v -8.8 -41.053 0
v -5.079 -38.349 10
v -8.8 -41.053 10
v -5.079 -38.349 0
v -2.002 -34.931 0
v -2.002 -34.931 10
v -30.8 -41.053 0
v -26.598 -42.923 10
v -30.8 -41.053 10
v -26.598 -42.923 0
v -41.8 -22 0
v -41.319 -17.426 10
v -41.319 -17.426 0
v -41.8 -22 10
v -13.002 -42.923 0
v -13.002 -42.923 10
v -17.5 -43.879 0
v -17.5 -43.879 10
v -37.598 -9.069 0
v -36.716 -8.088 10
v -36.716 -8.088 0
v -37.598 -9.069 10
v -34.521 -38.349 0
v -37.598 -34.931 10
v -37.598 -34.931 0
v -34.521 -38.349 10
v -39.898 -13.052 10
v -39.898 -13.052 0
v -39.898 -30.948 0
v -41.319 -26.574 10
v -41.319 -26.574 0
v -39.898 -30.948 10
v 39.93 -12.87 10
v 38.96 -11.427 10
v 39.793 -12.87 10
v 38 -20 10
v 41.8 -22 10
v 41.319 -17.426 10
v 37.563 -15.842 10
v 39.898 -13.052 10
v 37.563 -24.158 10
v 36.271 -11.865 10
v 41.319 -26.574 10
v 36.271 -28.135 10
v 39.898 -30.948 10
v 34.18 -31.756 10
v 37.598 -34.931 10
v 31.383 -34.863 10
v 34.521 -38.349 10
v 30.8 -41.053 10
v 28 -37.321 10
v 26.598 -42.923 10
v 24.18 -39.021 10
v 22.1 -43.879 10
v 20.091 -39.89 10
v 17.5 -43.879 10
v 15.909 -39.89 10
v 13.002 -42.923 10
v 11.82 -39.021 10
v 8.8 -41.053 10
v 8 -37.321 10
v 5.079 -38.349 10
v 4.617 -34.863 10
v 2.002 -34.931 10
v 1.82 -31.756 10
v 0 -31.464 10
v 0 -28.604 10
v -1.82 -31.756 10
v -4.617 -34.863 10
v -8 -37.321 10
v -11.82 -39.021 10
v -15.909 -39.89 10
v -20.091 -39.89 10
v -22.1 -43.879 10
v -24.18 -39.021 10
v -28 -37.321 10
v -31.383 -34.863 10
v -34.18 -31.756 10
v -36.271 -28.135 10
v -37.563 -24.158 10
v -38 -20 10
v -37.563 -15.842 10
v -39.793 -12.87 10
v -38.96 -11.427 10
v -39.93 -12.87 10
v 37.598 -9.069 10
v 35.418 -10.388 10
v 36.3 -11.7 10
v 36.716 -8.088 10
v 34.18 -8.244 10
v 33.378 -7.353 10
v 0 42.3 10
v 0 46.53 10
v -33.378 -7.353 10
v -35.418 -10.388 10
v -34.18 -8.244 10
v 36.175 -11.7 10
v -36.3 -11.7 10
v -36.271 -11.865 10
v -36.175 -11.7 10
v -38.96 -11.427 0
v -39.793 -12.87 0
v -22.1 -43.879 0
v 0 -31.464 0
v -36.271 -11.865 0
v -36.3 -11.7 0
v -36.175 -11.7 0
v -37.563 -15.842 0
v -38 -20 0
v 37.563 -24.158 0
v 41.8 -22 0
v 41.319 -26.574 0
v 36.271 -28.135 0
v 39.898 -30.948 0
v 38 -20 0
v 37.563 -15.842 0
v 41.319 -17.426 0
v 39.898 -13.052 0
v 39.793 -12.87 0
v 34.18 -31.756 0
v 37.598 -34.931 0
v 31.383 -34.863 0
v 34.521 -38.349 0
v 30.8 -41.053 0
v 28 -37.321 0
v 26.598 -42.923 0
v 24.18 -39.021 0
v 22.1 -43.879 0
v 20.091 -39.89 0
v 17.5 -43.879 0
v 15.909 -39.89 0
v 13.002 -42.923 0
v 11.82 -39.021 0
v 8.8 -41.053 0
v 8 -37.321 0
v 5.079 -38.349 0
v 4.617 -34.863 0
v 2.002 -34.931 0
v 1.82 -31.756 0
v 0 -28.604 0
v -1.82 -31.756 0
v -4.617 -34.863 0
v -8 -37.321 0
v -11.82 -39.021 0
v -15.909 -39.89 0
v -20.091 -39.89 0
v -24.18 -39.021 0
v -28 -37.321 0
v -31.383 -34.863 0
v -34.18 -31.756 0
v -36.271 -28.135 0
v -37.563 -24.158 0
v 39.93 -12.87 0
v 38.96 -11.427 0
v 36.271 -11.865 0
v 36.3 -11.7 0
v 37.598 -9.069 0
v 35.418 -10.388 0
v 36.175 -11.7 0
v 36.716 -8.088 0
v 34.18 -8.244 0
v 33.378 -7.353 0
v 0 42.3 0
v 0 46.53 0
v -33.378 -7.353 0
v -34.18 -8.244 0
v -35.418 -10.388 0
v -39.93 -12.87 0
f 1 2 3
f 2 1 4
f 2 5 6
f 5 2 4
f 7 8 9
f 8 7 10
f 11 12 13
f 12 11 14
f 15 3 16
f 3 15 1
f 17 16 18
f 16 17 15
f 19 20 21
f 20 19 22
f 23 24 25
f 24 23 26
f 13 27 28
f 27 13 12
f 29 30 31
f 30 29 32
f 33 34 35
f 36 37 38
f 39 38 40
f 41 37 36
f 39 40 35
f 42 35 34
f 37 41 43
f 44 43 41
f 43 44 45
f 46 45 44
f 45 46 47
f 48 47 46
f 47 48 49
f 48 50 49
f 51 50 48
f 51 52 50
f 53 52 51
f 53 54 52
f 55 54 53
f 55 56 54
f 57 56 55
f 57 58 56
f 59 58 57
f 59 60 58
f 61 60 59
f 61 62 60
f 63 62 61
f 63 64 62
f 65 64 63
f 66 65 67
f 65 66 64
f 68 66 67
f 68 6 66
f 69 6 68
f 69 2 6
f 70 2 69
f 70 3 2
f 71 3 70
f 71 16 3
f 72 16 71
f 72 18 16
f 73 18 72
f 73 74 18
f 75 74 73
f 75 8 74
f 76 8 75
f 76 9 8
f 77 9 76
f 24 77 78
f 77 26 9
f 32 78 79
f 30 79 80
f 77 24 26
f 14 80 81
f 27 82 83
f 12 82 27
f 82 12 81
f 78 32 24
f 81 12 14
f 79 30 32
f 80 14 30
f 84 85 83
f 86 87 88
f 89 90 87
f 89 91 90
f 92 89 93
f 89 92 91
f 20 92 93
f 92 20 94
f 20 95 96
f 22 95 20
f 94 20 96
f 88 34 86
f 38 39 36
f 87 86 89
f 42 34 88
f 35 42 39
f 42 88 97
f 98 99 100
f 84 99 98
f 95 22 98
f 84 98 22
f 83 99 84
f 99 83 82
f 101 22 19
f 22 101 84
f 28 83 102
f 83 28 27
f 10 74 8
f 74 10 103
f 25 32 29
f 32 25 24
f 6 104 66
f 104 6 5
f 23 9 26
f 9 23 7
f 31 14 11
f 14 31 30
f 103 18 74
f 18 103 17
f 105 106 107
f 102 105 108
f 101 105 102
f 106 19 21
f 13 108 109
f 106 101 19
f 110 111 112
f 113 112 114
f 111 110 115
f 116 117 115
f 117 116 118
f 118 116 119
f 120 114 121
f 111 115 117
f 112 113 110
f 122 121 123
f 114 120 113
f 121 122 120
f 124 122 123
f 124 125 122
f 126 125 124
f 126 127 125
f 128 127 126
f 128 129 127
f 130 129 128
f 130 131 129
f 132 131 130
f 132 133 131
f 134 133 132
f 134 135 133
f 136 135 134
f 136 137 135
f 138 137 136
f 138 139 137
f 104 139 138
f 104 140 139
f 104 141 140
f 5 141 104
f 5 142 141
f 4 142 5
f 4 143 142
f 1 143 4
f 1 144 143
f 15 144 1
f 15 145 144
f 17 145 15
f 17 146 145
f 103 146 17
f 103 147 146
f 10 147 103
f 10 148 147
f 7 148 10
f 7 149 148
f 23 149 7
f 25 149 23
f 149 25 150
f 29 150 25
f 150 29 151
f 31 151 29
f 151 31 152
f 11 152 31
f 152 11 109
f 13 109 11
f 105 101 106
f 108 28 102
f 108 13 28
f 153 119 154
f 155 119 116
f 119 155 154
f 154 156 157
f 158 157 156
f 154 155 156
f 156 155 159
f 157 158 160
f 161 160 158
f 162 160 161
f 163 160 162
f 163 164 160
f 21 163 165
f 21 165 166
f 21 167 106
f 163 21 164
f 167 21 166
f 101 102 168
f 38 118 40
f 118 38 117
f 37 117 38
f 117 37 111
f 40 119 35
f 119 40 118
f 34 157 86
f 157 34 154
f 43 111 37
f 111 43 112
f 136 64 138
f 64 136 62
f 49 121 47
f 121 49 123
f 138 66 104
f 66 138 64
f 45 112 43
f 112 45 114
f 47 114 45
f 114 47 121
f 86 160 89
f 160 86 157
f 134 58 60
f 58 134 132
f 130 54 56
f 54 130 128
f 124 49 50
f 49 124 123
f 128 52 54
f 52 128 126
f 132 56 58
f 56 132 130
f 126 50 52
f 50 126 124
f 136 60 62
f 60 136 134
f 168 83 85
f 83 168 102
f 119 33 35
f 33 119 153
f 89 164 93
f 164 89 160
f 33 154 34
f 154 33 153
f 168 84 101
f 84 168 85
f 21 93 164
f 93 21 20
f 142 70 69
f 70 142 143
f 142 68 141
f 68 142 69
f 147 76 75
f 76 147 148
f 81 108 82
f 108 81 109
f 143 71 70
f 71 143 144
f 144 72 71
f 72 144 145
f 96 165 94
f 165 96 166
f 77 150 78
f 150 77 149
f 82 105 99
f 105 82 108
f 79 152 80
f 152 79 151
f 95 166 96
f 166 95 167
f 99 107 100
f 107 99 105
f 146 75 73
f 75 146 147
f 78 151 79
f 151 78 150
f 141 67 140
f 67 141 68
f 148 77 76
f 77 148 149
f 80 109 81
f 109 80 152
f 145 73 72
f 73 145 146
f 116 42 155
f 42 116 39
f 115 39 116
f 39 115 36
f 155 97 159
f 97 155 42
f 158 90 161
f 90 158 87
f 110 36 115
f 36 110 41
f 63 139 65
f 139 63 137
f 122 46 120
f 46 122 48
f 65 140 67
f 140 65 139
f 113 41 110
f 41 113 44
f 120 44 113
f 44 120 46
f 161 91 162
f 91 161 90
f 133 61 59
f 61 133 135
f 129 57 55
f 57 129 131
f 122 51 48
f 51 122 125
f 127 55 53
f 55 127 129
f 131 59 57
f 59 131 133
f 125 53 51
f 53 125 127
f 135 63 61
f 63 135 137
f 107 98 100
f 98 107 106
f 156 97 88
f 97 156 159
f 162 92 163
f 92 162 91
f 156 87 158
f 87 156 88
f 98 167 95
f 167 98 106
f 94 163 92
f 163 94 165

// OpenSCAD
module heart() {
    
    hTopR = 20;
    hY = -20;
    coreD = 10;
    
    hInset = 2;
    
        translate([-hTopR+hInset, hY, 0])
   #         cylinder(r=hTopR, h=coreD);
        translate([hTopR-hInset, hY, 0])
            cylinder(r=hTopR, h=coreD);
            
     triPoly = [[ -hTopR*2+hInset+1.7, hY ], [hTopR*2-hInset-1.7, hY], [0, hY+hTopR*2.7]];
     
     sc = 1;
     cX = 0;
     cY = -8.3;
     
         translate([-cX, -cY, coreD/2])
                linear_extrude(height = coreD, center=true, scale=sc)
                    polygon(triPoly);

}

difference() {
    scale([1.1, 1.1, 1])
        heart();
    translate([0, 0, 0])
        heart();
};
